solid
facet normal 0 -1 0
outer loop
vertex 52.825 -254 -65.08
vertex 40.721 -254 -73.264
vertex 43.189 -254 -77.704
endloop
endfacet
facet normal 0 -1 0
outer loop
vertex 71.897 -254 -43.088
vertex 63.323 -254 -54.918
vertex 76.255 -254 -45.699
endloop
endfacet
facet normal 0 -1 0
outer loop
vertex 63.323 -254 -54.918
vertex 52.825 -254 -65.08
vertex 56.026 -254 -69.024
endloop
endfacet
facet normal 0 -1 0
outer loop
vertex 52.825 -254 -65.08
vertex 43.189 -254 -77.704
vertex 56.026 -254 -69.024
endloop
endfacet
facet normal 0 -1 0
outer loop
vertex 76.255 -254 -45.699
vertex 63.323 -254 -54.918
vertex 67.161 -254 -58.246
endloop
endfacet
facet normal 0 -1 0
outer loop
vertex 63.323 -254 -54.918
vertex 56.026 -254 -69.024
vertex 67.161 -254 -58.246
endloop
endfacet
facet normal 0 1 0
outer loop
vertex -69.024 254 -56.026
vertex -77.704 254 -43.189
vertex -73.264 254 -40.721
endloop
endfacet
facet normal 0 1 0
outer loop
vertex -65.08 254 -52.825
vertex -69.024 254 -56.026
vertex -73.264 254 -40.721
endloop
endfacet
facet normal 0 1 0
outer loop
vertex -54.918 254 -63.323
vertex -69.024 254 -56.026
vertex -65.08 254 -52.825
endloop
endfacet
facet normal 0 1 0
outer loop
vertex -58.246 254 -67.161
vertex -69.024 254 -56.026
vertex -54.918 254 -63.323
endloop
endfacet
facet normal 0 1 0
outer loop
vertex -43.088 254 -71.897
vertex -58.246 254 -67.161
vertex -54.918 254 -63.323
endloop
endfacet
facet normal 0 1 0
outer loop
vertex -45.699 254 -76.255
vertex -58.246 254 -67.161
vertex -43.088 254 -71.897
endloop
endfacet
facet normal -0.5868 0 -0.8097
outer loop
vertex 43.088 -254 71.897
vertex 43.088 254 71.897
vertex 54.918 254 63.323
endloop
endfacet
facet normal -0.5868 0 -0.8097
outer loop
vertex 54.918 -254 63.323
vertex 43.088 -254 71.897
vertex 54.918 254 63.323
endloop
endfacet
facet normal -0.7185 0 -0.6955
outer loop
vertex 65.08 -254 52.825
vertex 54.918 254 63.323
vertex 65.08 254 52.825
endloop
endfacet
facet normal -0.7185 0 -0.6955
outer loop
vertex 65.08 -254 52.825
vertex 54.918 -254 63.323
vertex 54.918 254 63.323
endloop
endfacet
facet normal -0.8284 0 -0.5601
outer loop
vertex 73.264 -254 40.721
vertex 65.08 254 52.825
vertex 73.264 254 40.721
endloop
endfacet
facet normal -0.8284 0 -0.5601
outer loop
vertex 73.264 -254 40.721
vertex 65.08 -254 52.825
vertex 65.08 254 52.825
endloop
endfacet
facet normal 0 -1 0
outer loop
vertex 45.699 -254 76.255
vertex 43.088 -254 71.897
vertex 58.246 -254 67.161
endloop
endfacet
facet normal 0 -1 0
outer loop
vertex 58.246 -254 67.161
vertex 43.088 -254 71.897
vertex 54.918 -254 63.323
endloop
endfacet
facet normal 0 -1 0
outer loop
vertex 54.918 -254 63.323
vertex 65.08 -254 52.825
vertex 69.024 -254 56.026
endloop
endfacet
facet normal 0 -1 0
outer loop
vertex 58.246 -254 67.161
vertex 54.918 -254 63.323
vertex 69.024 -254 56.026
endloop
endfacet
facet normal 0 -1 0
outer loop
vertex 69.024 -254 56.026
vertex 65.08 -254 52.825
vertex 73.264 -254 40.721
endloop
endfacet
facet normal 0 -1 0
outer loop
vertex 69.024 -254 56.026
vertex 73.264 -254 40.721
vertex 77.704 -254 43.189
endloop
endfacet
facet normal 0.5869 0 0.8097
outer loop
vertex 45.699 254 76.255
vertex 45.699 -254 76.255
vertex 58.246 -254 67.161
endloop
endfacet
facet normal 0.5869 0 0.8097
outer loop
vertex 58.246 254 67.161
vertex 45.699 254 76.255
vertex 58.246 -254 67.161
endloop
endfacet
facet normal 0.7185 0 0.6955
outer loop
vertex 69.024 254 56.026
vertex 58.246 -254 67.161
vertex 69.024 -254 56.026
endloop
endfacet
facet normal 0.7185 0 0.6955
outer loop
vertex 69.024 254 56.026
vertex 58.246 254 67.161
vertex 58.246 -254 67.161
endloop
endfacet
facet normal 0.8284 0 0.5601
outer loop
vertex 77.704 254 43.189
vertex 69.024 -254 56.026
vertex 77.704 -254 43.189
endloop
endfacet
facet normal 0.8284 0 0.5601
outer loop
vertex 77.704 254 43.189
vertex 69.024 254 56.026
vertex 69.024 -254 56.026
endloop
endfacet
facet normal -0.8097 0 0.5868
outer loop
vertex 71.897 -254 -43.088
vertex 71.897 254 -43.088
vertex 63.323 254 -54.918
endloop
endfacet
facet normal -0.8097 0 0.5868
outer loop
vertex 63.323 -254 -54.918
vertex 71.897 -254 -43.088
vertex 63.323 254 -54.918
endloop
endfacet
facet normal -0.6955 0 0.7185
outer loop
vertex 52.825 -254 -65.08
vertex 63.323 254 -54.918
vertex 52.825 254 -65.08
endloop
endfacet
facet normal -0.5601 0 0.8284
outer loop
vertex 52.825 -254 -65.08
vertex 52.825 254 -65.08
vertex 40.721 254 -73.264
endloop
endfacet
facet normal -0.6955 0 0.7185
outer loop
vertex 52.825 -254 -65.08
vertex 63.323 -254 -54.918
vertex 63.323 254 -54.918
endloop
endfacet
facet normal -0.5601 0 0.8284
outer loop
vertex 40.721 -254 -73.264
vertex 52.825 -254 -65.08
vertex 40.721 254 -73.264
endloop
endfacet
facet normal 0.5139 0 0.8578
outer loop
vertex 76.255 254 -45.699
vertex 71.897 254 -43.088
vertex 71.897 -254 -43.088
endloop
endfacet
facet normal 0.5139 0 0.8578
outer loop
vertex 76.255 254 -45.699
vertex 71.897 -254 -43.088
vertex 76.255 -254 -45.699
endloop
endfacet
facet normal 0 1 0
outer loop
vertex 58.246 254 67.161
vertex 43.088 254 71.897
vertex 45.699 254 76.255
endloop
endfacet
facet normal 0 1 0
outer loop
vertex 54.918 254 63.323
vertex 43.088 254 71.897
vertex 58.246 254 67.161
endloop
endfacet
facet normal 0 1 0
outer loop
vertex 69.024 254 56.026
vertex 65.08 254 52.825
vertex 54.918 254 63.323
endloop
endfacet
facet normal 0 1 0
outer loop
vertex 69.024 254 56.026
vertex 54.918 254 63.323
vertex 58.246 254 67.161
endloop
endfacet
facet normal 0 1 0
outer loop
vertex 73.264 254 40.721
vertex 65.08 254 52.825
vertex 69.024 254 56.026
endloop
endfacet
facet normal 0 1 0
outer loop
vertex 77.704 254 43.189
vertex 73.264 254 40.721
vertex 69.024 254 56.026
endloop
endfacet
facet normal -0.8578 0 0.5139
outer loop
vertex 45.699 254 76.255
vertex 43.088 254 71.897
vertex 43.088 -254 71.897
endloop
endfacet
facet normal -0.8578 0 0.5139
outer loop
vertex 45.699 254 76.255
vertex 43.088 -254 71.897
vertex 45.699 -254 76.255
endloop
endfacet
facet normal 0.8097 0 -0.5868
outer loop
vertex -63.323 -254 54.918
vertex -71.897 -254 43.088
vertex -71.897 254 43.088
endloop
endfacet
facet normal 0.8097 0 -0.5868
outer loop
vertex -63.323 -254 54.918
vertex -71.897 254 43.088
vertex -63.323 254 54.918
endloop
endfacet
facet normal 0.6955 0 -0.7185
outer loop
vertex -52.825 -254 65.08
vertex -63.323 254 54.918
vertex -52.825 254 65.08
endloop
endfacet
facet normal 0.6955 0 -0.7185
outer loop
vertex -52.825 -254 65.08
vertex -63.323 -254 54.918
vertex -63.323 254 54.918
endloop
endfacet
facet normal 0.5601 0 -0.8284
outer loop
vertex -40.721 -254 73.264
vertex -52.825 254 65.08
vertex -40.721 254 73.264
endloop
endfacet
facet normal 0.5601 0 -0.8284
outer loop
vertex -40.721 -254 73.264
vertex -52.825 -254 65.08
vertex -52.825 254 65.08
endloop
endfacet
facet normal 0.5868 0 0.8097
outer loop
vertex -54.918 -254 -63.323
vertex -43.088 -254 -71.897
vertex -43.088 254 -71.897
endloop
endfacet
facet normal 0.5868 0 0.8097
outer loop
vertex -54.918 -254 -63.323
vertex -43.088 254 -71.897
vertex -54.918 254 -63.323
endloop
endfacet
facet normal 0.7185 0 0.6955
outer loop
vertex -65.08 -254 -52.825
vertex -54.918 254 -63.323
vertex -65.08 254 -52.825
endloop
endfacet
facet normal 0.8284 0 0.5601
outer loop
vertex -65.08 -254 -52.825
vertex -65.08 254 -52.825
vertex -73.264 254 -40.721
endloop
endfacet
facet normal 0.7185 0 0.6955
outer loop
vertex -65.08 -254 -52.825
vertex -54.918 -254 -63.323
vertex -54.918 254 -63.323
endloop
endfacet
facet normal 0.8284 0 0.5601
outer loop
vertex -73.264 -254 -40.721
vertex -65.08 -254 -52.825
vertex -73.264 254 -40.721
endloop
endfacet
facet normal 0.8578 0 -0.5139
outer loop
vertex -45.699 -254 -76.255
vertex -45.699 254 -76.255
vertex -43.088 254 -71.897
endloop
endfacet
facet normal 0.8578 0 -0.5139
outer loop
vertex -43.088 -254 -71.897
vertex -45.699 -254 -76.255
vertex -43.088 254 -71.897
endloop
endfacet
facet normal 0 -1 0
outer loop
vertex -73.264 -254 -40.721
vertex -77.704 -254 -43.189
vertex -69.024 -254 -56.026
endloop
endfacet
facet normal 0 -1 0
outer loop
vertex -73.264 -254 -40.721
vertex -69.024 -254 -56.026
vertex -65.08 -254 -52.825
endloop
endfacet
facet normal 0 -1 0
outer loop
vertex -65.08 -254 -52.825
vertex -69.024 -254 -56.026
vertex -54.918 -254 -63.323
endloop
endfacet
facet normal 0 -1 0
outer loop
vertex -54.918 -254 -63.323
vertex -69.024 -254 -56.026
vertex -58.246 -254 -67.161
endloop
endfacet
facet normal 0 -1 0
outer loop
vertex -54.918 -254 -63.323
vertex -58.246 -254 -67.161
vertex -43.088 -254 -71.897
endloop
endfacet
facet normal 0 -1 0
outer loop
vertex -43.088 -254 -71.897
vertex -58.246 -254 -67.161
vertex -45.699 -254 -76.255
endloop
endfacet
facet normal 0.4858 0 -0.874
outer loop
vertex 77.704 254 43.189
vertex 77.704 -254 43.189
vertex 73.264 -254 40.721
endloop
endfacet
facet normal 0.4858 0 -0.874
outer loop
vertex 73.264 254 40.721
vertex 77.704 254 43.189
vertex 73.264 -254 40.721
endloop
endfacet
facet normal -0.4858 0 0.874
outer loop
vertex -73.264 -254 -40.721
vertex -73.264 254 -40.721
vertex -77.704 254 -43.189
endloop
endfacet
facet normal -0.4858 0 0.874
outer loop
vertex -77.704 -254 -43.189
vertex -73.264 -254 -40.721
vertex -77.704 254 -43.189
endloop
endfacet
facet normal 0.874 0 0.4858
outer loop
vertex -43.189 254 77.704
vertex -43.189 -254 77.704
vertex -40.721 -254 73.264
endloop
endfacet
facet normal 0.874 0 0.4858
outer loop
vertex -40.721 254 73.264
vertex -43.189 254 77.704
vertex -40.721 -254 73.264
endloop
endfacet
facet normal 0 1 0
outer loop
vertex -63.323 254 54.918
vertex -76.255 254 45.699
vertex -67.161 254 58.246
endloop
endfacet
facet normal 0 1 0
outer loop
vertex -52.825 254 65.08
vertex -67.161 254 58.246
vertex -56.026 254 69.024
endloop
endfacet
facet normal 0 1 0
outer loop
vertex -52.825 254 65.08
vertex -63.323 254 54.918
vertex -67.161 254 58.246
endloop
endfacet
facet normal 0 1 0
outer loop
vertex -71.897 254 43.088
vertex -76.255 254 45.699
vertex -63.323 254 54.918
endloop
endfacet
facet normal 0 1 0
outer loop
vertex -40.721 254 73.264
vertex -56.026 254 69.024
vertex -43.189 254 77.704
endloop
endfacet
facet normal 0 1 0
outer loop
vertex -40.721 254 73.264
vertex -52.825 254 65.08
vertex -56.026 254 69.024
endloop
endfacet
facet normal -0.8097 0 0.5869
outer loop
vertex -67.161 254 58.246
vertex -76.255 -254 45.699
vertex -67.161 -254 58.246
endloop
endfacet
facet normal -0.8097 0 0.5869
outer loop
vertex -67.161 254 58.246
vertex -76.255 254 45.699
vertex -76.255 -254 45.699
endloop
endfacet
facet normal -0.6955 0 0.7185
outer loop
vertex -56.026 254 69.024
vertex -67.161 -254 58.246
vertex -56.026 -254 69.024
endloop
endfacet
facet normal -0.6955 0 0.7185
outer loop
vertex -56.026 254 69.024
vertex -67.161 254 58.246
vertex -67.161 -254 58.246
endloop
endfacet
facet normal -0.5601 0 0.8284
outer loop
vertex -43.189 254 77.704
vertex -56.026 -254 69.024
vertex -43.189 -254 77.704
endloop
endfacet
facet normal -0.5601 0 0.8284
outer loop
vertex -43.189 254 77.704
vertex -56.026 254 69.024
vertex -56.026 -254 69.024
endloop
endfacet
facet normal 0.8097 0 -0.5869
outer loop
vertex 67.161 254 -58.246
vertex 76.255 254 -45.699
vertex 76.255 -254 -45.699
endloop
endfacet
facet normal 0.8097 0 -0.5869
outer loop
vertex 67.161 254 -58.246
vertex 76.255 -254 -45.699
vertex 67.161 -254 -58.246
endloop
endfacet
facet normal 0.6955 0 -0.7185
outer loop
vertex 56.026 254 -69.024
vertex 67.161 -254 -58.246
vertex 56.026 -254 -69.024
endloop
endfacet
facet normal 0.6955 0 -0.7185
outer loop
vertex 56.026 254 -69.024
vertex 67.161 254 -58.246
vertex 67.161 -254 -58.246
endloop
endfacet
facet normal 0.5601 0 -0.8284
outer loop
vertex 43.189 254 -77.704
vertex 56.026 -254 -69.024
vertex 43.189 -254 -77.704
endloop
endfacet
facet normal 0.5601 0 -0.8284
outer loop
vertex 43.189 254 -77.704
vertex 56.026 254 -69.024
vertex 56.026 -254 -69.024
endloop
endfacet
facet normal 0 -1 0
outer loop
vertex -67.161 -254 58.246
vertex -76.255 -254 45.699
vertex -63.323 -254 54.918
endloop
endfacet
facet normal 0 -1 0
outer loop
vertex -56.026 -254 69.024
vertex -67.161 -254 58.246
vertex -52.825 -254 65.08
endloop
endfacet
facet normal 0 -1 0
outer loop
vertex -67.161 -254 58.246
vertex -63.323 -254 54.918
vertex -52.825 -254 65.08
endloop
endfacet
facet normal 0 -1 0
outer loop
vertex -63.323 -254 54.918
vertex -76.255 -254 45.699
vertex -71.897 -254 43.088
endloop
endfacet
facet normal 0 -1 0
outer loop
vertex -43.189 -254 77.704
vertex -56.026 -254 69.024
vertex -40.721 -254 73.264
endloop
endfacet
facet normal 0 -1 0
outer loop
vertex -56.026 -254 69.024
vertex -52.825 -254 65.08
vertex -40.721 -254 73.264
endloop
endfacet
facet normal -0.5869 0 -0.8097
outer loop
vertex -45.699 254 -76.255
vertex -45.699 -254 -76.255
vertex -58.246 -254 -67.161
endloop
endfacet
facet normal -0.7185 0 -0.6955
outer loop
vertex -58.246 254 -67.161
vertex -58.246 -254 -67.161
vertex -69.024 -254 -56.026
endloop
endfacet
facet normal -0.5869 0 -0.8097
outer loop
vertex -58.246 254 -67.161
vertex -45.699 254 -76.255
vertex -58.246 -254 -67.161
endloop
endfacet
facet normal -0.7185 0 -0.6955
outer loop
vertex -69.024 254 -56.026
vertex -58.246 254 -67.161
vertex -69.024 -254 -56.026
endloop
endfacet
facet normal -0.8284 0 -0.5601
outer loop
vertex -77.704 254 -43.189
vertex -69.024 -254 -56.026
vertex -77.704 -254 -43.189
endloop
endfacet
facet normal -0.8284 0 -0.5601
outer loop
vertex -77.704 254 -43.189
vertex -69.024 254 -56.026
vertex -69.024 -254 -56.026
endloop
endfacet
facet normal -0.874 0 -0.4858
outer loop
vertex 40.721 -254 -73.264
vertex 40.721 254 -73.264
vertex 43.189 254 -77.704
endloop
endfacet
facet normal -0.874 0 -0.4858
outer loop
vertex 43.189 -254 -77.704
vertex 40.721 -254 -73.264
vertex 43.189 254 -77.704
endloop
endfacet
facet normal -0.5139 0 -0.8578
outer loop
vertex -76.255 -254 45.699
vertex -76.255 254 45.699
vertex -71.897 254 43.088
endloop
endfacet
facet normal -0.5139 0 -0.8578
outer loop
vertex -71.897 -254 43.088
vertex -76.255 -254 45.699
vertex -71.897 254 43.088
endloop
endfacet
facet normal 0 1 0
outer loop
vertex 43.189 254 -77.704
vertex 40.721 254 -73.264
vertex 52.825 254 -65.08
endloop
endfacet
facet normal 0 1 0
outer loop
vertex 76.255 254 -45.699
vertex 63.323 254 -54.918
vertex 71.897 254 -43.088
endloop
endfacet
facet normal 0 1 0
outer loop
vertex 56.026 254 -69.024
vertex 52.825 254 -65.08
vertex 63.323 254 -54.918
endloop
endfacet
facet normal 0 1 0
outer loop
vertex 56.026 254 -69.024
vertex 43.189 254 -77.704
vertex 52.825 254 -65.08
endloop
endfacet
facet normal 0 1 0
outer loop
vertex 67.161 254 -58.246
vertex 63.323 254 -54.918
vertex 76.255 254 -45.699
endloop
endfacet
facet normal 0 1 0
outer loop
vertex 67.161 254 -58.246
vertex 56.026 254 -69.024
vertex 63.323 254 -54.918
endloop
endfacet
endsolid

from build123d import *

# Parameters (mm, degrees)
SKETCH2_R               = 88.9
SKETCH2_R_2             = 83.82
BOSS_EXTRUDE1_DEPTH     = 254
CUT_EXTRUDE1_DEPTH      = 255
CUT_EXTRUDE1_DEPTH_BACK = 255


with BuildPart() as part:
    # Sketch2 → Boss-Extrude1 (new body, symmetric)
    with BuildSketch(Plane(origin=(0, 0, 0), x_dir=(1, 0, 0), z_dir=(0, 1, 0))):
        Circle(SKETCH2_R)
        Circle(SKETCH2_R_2, mode=Mode.SUBTRACT)
    extrude(amount=BOSS_EXTRUDE1_DEPTH, both=True)

    # Sketch3 → Cut-Extrude1 (cut, two sides)
    with BuildSketch(Plane(origin=(0, 0, 0), x_dir=(1, 0, 0), z_dir=(0, 1, 0))) as cut_extrude1_sk:
        Polygon((169.661755759, -94.300371224), (0, 0), (169.661755759, 101.677593364), align=None)
        Polygon((0, 0), (53.900027233, 96.974944394), (-58.116685864, 96.974944394), align=None)
        Polygon((-123.741299607, 68.777140945), (-123.741299607, -74.157652604), (0, 0), align=None)
        Polygon((-65.840936026, -118.45858783), (0, 0), (70.991745134, -118.45858783), align=None)
    extrude(amount=CUT_EXTRUDE1_DEPTH, mode=Mode.SUBTRACT)
    extrude(cut_extrude1_sk.sketch, amount=-CUT_EXTRUDE1_DEPTH_BACK, mode=Mode.SUBTRACT)


solid = part.part
